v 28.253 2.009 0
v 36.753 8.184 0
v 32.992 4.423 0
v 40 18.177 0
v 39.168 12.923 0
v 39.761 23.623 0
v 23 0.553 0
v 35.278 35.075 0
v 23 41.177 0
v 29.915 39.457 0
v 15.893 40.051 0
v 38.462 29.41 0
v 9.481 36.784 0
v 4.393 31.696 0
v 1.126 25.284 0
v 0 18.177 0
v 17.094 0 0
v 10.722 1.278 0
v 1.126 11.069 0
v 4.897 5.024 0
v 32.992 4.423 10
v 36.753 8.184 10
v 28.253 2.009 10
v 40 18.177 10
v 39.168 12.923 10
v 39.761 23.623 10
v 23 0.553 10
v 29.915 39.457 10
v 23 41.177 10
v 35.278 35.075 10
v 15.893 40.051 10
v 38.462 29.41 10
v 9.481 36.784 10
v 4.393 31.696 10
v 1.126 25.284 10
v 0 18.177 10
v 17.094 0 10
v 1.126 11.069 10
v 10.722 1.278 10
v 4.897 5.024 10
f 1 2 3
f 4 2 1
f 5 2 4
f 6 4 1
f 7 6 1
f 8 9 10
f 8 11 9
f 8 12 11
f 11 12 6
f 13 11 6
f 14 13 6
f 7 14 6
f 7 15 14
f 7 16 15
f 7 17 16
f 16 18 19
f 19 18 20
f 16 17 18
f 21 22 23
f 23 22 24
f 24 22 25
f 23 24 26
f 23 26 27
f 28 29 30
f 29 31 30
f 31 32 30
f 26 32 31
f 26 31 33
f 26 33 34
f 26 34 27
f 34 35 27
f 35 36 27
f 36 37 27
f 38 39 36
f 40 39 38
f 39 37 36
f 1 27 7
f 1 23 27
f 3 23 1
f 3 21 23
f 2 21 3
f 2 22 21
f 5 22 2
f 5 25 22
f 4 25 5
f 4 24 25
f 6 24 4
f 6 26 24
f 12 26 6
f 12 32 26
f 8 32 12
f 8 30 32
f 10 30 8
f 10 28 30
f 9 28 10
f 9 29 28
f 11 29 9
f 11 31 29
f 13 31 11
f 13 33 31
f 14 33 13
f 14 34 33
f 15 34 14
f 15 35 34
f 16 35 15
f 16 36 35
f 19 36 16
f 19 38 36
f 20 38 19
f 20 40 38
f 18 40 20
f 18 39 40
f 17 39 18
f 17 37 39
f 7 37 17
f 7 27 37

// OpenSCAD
$fn = 32;

// ----------------------------------------------------------------------
// Cam disc: base radius 17.0 mm, lift 6.0 mm, 20 profile points
// ----------------------------------------------------------------------

// --- parameters (mm) ---
profile_height = 10;      // extrusion height
profile_points = 20;      // points of the closed outline

profile = [[40, 18.177], [39.761, 23.623], [38.462, 29.41], [35.278, 35.075], [29.915, 39.457], [23, 41.177], [15.893, 40.051], [9.481, 36.784], [4.393, 31.696], [1.126, 25.284], [0, 18.177], [1.126, 11.069], [4.897, 5.024], [10.722, 1.278], [17.094, 0], [23, 0.553], [28.253, 2.009], [32.992, 4.423], [36.753, 8.184], [39.168, 12.923]];  // single closed polygon, 20 points, counter clockwise

// --- the one profile operation ---
linear_extrude(height = profile_height) polygon(points = profile);
